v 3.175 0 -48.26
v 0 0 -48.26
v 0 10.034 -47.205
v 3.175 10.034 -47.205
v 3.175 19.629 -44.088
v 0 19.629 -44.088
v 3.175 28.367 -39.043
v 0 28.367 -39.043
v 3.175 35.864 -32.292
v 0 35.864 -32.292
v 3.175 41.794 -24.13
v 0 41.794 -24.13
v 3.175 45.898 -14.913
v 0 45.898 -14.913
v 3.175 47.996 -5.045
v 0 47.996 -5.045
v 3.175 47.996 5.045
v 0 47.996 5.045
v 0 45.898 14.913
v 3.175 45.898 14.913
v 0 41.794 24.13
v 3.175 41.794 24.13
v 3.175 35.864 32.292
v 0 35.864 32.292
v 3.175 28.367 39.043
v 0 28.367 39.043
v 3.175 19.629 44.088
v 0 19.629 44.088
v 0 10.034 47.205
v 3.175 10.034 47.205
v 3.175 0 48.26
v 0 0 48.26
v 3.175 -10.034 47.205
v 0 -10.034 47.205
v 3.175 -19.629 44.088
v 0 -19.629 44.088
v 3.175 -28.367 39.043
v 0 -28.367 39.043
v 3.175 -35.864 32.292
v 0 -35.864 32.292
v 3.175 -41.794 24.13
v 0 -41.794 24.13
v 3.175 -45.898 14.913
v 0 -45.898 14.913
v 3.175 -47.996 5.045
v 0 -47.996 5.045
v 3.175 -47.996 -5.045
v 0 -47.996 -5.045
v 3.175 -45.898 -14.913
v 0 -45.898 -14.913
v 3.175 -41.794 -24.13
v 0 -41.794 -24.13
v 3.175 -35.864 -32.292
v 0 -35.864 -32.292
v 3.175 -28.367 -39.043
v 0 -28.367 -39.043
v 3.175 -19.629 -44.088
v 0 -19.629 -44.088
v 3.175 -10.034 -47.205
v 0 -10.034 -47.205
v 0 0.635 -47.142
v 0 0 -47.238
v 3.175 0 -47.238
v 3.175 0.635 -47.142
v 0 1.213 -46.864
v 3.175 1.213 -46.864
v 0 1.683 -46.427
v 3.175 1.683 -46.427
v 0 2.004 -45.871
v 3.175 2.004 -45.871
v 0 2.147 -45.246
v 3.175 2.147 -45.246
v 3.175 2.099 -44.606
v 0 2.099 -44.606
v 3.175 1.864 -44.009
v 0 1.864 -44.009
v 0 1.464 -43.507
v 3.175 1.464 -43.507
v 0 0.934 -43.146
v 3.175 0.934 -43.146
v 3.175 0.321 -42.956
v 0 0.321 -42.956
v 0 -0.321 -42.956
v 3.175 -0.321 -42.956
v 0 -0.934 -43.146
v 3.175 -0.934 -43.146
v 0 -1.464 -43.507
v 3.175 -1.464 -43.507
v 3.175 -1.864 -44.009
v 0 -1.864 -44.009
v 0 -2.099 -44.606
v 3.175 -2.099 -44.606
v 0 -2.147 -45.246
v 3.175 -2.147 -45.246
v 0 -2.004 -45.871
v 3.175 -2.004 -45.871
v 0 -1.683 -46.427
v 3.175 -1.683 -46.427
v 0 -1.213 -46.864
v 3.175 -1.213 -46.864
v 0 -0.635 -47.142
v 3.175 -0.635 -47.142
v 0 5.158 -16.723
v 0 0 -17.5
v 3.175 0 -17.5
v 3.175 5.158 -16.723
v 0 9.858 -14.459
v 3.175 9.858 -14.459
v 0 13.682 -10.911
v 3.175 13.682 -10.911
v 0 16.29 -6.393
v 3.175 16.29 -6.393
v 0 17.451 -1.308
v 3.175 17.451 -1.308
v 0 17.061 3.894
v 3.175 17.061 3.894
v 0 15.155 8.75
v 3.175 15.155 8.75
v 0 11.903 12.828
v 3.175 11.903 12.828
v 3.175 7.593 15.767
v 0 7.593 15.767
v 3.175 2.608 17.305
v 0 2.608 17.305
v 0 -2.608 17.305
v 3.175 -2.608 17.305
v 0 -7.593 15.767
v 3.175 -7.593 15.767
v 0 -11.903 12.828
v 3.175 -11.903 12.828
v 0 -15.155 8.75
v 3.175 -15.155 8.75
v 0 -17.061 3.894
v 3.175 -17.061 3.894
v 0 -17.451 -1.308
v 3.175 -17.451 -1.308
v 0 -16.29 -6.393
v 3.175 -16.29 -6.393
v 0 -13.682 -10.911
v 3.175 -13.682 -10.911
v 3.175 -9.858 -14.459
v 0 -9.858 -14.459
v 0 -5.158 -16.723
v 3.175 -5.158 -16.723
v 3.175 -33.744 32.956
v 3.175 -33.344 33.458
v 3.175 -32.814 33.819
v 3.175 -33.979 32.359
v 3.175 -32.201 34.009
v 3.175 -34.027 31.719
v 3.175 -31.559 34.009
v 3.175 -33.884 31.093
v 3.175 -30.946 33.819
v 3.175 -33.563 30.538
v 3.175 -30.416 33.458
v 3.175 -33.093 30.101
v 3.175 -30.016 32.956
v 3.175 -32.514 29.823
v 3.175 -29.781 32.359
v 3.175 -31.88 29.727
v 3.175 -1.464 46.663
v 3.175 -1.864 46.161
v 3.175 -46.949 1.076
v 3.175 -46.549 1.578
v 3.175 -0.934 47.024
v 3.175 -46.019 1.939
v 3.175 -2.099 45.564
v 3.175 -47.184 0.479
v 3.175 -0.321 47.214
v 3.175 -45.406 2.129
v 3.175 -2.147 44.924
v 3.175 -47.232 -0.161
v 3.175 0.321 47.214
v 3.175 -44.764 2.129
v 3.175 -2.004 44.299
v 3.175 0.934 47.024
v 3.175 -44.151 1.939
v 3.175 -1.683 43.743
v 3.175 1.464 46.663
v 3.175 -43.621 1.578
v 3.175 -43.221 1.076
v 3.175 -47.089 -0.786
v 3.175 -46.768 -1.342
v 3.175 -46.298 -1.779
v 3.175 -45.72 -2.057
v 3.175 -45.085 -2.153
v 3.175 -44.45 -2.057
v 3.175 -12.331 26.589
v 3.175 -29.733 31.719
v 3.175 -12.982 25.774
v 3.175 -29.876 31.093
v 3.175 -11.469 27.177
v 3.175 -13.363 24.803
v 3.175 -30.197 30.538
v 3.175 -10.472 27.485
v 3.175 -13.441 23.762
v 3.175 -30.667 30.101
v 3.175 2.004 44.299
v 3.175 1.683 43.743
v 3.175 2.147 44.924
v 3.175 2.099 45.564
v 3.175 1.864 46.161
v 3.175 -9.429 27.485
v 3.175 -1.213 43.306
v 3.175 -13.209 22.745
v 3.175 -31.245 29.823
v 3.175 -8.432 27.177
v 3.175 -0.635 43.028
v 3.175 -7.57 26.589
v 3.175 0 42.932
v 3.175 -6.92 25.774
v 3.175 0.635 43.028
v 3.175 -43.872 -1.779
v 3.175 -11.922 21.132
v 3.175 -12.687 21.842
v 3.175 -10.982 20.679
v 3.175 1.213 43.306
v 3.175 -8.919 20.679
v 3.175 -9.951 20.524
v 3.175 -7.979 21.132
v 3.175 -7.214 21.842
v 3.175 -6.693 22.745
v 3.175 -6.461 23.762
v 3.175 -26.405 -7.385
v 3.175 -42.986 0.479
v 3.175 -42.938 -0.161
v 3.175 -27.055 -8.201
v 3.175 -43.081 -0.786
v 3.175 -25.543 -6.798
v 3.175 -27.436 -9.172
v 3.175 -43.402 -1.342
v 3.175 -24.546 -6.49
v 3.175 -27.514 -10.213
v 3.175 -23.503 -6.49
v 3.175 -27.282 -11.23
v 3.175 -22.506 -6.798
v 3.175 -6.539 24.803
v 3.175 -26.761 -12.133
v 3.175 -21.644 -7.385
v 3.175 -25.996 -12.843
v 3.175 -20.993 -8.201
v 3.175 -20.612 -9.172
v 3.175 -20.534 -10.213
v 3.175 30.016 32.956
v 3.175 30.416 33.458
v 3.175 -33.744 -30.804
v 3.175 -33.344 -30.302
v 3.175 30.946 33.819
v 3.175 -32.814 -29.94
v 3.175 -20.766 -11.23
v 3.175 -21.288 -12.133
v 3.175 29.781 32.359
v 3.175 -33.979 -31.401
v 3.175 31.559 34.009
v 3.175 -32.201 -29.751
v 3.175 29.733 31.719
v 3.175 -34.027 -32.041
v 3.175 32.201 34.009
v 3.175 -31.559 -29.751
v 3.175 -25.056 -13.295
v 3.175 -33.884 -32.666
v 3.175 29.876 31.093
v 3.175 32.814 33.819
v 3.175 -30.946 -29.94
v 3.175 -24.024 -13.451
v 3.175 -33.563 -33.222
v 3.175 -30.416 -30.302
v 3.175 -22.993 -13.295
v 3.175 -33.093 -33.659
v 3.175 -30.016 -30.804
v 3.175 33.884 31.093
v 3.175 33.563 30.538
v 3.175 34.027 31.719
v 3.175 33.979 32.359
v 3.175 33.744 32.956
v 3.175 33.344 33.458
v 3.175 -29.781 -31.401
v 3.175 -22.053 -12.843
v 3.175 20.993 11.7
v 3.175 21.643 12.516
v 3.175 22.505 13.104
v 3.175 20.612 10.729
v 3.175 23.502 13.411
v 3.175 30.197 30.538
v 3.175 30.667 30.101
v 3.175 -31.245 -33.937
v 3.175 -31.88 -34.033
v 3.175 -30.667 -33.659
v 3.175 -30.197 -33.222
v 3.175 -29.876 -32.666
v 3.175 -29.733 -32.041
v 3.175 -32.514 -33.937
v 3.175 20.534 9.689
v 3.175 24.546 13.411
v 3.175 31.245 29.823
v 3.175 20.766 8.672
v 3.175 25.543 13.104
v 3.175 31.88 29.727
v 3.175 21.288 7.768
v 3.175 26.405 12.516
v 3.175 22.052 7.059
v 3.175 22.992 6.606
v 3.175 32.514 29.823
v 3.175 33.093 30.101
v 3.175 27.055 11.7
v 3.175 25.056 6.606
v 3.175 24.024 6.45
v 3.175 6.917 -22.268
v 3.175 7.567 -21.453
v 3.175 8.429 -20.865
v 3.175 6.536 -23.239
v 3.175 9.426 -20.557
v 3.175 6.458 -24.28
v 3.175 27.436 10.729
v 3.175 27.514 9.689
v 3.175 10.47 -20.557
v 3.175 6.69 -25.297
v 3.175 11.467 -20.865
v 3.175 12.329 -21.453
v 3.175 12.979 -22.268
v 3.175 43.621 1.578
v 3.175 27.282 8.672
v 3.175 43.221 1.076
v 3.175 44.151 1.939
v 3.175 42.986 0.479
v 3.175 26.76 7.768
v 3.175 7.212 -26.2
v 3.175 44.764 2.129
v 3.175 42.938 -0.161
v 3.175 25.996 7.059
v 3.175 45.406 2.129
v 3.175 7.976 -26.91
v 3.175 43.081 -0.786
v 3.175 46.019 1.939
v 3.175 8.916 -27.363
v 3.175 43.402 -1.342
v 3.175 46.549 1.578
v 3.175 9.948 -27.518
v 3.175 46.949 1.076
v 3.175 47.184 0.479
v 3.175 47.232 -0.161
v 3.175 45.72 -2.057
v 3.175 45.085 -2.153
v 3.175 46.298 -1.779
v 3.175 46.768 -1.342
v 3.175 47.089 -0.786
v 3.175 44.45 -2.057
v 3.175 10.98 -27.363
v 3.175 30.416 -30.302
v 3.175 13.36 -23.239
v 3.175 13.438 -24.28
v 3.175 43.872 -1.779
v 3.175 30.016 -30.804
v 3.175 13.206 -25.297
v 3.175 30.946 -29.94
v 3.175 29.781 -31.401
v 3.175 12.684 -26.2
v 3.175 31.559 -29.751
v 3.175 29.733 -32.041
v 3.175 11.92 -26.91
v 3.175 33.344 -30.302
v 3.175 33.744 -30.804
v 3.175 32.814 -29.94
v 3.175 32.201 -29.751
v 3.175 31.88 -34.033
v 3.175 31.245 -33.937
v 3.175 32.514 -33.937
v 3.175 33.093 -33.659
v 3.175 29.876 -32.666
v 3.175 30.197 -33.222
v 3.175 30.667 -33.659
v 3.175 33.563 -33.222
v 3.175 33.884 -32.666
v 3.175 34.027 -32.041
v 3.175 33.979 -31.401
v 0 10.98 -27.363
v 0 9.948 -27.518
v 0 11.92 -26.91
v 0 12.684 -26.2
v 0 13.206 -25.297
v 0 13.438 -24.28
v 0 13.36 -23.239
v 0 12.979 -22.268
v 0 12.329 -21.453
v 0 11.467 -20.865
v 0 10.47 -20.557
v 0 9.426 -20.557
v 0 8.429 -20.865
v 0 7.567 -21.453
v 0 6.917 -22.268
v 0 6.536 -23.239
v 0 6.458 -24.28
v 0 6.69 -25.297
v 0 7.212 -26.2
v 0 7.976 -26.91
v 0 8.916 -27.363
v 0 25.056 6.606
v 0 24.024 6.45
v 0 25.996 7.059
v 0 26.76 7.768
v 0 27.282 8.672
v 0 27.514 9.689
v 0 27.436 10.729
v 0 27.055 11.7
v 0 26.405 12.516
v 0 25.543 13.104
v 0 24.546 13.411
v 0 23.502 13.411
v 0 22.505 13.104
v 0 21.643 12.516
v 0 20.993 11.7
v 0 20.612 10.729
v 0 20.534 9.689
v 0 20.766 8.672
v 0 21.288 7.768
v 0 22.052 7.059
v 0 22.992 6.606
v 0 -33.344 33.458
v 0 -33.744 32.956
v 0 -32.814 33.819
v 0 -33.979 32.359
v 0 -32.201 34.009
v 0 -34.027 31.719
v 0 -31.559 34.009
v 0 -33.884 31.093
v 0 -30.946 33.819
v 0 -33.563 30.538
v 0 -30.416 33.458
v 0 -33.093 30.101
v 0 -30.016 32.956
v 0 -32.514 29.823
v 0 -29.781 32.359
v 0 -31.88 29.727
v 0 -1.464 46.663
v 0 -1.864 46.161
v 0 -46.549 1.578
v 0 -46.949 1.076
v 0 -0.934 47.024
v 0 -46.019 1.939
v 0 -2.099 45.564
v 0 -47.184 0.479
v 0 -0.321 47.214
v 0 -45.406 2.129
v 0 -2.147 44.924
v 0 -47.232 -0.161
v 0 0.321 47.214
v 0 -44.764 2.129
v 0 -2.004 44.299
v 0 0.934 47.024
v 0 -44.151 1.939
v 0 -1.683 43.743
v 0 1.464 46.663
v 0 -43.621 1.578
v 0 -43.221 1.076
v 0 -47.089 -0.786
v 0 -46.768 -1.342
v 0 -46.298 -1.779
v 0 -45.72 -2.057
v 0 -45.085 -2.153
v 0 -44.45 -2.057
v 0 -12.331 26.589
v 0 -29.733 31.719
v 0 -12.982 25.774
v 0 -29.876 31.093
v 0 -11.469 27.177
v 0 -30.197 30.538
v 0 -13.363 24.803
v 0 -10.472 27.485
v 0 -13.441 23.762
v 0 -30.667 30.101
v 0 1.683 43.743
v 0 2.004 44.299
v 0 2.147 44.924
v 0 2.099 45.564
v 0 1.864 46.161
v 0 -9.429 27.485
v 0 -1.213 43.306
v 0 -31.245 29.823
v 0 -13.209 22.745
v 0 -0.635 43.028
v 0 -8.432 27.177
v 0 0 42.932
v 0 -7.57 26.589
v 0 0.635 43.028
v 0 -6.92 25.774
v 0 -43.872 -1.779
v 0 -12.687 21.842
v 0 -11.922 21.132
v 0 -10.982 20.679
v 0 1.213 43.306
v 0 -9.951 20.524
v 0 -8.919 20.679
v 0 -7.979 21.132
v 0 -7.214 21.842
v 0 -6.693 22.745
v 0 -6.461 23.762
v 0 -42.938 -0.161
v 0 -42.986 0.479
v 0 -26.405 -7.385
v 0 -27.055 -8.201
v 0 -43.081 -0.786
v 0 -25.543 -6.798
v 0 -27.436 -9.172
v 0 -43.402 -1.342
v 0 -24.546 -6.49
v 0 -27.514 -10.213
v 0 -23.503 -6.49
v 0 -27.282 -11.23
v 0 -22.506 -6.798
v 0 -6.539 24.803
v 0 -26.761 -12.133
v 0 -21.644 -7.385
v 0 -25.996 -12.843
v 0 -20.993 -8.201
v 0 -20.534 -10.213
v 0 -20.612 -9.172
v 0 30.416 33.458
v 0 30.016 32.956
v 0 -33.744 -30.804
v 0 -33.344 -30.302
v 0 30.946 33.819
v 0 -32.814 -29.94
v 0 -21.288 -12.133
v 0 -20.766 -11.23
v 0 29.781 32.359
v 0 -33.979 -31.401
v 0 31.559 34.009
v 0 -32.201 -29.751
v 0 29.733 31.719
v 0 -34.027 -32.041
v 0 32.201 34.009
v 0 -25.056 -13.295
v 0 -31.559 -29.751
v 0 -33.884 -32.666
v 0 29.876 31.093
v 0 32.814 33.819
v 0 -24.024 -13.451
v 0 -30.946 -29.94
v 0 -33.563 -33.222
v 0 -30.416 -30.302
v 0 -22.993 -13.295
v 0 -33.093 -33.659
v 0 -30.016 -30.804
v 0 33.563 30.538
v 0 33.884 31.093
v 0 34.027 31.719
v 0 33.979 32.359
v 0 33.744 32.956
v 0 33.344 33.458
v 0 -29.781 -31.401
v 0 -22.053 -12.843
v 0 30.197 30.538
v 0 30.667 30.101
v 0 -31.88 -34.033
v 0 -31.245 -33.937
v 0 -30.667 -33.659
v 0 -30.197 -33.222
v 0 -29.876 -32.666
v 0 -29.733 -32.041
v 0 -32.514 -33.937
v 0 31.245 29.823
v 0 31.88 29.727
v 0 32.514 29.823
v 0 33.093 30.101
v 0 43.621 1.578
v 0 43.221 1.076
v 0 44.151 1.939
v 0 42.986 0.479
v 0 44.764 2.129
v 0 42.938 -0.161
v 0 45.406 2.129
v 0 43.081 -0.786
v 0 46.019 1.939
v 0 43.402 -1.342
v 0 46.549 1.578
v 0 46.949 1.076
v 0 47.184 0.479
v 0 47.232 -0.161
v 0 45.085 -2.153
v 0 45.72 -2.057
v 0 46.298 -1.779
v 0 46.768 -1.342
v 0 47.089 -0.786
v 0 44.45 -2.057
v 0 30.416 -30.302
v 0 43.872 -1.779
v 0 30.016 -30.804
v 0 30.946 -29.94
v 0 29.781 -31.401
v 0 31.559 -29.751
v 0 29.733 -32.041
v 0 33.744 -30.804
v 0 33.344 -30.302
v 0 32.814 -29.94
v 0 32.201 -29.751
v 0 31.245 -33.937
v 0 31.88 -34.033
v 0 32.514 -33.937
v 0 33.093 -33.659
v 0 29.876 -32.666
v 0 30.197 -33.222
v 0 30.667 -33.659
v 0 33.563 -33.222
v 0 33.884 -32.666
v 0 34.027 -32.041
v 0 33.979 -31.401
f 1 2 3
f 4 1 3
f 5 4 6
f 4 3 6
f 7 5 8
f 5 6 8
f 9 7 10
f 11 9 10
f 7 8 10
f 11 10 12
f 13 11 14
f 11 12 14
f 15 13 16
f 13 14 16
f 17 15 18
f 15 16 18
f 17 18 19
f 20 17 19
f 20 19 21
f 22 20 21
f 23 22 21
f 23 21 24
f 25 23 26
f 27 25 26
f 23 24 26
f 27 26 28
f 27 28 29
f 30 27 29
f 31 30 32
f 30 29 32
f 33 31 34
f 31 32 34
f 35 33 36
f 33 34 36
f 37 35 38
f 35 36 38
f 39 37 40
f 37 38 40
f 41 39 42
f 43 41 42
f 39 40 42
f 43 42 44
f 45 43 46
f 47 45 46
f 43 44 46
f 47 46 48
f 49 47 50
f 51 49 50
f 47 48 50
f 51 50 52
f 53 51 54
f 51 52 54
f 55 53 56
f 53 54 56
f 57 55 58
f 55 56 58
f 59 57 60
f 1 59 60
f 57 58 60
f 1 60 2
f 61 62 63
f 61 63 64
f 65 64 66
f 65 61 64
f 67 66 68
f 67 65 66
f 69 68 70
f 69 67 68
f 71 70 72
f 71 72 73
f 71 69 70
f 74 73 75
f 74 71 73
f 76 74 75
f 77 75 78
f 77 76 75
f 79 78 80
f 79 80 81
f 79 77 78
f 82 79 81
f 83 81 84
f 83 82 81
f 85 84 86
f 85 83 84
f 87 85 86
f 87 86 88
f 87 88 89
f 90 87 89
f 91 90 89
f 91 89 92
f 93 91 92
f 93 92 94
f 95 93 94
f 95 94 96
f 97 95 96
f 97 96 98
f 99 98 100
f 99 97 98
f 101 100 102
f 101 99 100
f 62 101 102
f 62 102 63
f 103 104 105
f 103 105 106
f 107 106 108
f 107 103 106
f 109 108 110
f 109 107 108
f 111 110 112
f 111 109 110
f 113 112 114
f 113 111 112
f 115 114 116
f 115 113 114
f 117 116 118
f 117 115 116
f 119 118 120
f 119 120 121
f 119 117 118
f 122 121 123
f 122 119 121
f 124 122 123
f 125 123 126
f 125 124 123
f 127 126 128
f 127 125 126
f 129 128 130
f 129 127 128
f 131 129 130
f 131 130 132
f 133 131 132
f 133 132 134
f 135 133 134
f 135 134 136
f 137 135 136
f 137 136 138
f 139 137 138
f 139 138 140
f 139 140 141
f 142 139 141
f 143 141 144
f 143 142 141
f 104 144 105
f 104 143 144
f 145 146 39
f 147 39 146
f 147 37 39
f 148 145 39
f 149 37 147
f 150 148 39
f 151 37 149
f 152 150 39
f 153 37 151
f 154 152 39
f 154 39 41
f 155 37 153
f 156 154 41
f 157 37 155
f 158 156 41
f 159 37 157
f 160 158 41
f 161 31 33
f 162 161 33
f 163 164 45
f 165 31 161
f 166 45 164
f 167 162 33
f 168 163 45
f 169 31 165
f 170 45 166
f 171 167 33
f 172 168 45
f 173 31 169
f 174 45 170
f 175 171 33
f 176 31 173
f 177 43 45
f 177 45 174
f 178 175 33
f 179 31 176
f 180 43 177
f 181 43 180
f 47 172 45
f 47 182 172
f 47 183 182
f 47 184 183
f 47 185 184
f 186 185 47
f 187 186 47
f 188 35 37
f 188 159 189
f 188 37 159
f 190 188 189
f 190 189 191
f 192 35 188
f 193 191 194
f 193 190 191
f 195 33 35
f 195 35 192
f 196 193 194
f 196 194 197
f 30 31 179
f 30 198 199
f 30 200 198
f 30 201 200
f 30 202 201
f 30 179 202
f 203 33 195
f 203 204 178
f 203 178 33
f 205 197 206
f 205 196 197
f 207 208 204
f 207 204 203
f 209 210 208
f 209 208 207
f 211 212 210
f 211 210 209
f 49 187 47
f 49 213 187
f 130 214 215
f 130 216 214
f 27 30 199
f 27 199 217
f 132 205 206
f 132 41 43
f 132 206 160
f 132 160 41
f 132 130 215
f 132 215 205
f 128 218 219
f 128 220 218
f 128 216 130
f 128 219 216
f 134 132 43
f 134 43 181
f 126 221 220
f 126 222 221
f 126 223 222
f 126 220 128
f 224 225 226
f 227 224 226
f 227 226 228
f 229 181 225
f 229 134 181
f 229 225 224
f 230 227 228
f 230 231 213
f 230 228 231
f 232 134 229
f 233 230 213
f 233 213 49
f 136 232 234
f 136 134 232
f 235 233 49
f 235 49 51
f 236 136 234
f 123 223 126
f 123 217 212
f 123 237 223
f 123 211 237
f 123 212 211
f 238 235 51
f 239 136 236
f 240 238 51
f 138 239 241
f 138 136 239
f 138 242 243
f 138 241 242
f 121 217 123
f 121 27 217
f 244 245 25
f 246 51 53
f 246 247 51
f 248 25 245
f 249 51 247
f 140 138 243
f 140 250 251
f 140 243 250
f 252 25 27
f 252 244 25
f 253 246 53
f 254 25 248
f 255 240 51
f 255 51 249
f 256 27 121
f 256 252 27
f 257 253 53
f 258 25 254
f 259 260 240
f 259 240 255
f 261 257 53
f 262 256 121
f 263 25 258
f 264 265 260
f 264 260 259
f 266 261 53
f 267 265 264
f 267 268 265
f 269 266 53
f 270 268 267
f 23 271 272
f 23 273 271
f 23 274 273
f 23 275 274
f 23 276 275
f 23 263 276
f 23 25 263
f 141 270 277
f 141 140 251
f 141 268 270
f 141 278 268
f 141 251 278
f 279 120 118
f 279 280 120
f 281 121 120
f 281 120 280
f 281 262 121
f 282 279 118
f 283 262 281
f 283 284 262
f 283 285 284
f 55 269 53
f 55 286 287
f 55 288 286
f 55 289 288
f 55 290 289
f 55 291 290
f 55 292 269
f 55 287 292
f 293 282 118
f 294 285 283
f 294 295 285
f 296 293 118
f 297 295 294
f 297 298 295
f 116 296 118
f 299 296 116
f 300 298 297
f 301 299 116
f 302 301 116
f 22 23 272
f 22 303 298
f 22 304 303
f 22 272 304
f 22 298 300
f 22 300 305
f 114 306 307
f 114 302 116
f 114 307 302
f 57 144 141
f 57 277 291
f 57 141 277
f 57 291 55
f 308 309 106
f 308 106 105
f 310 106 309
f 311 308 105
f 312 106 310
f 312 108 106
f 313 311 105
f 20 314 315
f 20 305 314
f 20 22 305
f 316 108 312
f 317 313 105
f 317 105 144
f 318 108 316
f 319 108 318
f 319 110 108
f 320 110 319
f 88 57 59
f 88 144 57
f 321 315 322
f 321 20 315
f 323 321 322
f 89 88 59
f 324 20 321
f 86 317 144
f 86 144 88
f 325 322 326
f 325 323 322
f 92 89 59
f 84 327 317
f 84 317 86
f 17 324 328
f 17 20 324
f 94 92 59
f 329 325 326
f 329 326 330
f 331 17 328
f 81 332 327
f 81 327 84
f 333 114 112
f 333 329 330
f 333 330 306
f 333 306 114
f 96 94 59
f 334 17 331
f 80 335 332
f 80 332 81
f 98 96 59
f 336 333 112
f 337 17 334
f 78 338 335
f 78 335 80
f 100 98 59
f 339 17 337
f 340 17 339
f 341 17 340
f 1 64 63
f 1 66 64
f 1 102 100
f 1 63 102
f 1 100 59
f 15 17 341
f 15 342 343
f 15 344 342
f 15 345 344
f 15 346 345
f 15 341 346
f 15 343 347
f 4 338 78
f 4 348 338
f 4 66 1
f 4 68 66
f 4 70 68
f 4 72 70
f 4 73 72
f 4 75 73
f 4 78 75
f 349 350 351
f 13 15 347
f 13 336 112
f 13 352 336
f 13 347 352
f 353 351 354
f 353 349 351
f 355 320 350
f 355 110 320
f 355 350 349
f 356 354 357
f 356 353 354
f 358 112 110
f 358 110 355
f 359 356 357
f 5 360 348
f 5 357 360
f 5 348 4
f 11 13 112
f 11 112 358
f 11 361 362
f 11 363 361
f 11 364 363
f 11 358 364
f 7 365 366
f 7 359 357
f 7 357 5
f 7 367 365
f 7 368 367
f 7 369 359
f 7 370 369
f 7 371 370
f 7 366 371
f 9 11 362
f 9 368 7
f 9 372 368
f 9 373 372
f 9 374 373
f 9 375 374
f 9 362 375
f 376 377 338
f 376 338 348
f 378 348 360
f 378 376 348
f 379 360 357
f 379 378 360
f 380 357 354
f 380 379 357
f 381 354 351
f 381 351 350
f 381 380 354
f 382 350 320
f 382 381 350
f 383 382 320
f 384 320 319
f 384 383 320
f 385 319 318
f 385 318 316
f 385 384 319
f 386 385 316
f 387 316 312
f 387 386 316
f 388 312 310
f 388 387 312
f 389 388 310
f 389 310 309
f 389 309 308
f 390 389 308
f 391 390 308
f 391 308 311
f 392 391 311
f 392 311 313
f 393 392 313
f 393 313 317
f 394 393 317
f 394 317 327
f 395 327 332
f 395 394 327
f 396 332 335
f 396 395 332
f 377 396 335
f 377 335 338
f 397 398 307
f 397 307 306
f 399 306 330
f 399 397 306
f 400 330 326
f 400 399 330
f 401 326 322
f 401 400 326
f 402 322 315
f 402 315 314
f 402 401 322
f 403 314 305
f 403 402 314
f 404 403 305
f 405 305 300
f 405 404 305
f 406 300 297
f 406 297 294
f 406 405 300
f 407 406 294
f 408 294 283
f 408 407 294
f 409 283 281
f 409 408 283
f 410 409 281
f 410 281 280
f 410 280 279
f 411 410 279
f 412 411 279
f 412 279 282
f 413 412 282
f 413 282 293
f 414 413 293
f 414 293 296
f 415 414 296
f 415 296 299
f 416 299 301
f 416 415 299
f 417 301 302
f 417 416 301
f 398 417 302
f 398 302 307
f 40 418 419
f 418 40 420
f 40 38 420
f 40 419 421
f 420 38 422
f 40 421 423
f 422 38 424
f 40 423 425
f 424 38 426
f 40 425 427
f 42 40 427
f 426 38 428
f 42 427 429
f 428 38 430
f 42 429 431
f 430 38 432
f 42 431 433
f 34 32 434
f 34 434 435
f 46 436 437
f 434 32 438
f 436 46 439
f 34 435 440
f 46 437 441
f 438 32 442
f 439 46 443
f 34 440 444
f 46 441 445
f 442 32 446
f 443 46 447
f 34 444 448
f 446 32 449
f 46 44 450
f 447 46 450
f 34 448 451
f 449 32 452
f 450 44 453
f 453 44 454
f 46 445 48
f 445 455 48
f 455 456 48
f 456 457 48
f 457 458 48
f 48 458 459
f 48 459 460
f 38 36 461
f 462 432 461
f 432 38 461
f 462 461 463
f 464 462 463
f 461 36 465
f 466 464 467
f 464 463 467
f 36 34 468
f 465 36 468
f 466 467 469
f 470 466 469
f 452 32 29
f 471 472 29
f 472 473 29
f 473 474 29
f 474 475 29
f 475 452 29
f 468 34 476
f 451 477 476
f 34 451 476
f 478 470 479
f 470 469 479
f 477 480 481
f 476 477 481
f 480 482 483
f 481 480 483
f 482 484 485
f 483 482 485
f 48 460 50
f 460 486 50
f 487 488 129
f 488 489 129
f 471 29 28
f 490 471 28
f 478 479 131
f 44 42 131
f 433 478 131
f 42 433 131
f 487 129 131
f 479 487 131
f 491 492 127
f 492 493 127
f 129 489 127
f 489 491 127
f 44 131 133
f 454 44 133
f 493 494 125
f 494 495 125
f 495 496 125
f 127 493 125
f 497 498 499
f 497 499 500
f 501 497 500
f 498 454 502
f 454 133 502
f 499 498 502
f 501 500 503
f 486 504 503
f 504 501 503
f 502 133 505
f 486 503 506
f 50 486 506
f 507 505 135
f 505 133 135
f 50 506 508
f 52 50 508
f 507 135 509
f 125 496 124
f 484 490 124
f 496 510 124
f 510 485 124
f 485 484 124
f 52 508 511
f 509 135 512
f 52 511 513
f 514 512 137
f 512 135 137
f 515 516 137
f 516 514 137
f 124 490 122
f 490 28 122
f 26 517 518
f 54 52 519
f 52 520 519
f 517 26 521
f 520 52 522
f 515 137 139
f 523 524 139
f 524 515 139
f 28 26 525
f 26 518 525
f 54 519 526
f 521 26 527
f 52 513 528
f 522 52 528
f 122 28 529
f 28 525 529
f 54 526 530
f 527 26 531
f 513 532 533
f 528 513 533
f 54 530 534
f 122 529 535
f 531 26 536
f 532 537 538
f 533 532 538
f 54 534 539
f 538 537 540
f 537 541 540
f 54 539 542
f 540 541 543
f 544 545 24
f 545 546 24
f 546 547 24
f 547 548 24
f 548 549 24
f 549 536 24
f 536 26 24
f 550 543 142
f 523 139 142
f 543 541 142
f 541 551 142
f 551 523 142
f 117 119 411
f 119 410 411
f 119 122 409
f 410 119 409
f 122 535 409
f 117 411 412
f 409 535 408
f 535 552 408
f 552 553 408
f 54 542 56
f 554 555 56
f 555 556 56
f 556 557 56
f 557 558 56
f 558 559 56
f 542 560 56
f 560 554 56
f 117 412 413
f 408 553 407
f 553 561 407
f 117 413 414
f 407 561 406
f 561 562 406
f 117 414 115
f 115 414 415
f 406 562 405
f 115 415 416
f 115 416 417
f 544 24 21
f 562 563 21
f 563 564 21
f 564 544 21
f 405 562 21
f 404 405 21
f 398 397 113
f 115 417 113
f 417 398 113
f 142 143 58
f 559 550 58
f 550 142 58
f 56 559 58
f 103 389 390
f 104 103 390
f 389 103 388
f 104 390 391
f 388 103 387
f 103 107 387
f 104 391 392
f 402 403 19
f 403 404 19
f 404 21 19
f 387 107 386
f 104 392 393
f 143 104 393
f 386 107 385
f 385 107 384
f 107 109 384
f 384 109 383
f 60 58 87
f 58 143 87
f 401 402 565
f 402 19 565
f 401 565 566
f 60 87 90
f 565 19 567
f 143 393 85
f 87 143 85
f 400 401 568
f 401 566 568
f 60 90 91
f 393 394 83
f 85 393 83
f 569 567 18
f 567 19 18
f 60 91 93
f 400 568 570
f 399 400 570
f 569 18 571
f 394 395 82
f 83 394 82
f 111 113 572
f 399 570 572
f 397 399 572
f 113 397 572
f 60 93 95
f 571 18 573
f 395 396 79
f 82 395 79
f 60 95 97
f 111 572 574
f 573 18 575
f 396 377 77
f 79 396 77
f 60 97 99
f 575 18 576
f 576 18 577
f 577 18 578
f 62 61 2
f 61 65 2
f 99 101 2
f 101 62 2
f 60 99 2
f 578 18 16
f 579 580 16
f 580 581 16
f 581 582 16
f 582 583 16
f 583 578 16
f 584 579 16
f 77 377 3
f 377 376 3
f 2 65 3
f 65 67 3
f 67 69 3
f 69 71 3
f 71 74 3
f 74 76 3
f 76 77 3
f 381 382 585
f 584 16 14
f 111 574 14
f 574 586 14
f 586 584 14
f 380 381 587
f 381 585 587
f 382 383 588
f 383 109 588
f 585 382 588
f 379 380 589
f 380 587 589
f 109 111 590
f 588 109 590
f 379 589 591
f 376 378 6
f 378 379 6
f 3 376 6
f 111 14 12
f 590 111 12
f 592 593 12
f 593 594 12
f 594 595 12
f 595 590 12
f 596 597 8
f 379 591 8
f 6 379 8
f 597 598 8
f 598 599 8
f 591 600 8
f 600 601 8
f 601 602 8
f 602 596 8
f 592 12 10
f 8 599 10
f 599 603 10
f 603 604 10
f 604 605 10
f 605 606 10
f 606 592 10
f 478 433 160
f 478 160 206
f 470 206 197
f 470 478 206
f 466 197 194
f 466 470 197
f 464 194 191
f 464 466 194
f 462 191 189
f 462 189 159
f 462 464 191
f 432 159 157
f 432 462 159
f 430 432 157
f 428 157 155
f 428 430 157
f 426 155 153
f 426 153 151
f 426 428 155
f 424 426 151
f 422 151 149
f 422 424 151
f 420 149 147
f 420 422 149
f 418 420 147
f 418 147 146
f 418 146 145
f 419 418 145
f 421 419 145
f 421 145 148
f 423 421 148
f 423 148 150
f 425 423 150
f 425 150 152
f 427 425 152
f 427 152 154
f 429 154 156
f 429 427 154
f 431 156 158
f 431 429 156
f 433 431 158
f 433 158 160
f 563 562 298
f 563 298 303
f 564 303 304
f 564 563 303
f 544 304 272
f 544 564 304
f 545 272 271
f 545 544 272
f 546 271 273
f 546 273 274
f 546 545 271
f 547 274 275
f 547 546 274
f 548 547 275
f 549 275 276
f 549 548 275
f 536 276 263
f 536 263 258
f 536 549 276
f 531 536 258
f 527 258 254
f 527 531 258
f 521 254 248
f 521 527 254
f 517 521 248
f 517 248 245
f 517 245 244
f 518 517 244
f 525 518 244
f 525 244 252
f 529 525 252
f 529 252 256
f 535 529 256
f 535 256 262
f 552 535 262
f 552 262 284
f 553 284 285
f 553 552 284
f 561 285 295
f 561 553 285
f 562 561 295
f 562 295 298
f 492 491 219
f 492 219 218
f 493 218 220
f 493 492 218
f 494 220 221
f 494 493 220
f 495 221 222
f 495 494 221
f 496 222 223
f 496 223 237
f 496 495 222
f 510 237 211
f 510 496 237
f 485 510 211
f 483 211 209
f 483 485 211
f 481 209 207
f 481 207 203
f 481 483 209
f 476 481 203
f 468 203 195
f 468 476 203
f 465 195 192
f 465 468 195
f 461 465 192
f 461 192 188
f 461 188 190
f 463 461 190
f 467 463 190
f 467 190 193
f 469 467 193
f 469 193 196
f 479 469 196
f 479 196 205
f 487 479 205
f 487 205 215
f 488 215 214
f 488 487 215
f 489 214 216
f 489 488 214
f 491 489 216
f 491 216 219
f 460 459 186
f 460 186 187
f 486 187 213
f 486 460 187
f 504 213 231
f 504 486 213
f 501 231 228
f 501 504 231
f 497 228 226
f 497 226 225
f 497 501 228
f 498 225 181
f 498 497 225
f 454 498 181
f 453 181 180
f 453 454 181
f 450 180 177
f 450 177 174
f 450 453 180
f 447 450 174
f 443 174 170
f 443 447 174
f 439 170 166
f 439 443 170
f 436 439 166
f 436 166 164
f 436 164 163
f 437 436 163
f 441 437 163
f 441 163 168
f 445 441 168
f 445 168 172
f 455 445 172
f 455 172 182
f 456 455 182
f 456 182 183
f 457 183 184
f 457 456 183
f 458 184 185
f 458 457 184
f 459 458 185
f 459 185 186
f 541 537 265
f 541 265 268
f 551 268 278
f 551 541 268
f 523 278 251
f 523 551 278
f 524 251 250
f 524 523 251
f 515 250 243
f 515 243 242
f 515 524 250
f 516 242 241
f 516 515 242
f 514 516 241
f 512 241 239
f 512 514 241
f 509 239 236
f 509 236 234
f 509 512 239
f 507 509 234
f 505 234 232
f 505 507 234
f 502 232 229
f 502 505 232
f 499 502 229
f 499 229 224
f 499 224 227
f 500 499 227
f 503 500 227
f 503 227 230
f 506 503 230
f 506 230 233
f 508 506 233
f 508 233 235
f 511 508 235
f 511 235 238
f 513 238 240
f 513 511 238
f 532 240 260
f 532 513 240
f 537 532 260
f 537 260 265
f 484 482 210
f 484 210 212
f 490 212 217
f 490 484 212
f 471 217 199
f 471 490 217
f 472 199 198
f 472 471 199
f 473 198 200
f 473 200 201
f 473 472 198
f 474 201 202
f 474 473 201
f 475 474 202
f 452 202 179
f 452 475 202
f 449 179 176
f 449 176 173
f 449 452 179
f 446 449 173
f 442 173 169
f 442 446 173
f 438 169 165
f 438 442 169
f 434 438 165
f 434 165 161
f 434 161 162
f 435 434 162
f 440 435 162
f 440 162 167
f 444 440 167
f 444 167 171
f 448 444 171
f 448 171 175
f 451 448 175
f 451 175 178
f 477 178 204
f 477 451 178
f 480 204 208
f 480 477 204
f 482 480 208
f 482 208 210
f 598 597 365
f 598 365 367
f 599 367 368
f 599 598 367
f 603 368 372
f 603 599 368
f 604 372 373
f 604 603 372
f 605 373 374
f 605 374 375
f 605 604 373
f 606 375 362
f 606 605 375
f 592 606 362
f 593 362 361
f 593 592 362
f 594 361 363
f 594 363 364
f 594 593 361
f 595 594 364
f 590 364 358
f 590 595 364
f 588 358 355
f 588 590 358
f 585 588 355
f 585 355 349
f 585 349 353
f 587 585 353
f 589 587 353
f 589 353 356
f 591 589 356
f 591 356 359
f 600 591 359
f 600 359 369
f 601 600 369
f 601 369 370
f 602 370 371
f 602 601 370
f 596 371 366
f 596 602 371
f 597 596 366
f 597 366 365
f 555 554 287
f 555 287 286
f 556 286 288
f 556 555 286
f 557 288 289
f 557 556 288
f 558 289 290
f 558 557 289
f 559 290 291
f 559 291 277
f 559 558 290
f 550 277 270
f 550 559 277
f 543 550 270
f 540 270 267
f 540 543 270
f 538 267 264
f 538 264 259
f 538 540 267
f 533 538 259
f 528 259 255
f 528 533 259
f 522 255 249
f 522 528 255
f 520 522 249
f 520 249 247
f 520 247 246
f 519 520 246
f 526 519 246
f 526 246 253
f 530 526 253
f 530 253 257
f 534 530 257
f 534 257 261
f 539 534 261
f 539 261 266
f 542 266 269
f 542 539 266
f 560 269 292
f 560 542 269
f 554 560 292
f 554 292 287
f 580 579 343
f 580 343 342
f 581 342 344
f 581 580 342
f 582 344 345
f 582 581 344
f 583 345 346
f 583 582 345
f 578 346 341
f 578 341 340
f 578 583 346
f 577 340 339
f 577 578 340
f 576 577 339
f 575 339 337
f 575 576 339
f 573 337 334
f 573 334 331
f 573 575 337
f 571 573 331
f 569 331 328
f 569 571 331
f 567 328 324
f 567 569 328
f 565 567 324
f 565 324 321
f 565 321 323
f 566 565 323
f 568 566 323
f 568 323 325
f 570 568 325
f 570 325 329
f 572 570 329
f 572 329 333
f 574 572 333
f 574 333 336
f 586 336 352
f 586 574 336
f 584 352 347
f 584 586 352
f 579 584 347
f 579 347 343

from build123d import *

# Parameters (mm, degrees)
SKETCH1_R           = 48.26
SKETCH1_R_2         = 2.15265
SKETCH1_R_3         = 3.5
SKETCH1_R_4         = 17.5
BOSS_EXTRUDE1_DEPTH = 3.175


with BuildPart() as part:
    # Sketch1 → Boss-Extrude1 (new body)
    with BuildSketch(Plane(origin=(0, 0, 0), x_dir=(0, 0, -1), z_dir=(1, 0, 0))):
        Circle(SKETCH1_R)
        with Locations((0, 45.085)):
            Circle(SKETCH1_R_2, mode=Mode.SUBTRACT)
        with Locations((-24.023795501, -9.950801949)):
            Circle(SKETCH1_R_3, mode=Mode.SUBTRACT)
        with Locations((31.87990923, 31.87990923)):
            Circle(SKETCH1_R_2, mode=Mode.SUBTRACT)
        with Locations((45.085, 0)):
            Circle(SKETCH1_R_2, mode=Mode.SUBTRACT)
        with Locations((24.018239985, 9.948012748)):
            Circle(SKETCH1_R_3, mode=Mode.SUBTRACT)
        with Locations((-9.9503853, 24.023968076)):
            Circle(SKETCH1_R_3, mode=Mode.SUBTRACT)
        with Locations((31.87990923, -31.87990923)):
            Circle(SKETCH1_R_2, mode=Mode.SUBTRACT)
        with Locations((0, -45.085)):
            Circle(SKETCH1_R_2, mode=Mode.SUBTRACT)
        with Locations((-31.87990923, -31.87990923)):
            Circle(SKETCH1_R_2, mode=Mode.SUBTRACT)
        with Locations((-45.085, 0)):
            Circle(SKETCH1_R_2, mode=Mode.SUBTRACT)
        with Locations((-31.87990923, 31.87990923)):
            Circle(SKETCH1_R_2, mode=Mode.SUBTRACT)
        Circle(SKETCH1_R_4, mode=Mode.SUBTRACT)
        with Locations((9.950974523, -24.02421215)):
            Circle(SKETCH1_R_3, mode=Mode.SUBTRACT)
    extrude(amount=BOSS_EXTRUDE1_DEPTH)


solid = part.part
